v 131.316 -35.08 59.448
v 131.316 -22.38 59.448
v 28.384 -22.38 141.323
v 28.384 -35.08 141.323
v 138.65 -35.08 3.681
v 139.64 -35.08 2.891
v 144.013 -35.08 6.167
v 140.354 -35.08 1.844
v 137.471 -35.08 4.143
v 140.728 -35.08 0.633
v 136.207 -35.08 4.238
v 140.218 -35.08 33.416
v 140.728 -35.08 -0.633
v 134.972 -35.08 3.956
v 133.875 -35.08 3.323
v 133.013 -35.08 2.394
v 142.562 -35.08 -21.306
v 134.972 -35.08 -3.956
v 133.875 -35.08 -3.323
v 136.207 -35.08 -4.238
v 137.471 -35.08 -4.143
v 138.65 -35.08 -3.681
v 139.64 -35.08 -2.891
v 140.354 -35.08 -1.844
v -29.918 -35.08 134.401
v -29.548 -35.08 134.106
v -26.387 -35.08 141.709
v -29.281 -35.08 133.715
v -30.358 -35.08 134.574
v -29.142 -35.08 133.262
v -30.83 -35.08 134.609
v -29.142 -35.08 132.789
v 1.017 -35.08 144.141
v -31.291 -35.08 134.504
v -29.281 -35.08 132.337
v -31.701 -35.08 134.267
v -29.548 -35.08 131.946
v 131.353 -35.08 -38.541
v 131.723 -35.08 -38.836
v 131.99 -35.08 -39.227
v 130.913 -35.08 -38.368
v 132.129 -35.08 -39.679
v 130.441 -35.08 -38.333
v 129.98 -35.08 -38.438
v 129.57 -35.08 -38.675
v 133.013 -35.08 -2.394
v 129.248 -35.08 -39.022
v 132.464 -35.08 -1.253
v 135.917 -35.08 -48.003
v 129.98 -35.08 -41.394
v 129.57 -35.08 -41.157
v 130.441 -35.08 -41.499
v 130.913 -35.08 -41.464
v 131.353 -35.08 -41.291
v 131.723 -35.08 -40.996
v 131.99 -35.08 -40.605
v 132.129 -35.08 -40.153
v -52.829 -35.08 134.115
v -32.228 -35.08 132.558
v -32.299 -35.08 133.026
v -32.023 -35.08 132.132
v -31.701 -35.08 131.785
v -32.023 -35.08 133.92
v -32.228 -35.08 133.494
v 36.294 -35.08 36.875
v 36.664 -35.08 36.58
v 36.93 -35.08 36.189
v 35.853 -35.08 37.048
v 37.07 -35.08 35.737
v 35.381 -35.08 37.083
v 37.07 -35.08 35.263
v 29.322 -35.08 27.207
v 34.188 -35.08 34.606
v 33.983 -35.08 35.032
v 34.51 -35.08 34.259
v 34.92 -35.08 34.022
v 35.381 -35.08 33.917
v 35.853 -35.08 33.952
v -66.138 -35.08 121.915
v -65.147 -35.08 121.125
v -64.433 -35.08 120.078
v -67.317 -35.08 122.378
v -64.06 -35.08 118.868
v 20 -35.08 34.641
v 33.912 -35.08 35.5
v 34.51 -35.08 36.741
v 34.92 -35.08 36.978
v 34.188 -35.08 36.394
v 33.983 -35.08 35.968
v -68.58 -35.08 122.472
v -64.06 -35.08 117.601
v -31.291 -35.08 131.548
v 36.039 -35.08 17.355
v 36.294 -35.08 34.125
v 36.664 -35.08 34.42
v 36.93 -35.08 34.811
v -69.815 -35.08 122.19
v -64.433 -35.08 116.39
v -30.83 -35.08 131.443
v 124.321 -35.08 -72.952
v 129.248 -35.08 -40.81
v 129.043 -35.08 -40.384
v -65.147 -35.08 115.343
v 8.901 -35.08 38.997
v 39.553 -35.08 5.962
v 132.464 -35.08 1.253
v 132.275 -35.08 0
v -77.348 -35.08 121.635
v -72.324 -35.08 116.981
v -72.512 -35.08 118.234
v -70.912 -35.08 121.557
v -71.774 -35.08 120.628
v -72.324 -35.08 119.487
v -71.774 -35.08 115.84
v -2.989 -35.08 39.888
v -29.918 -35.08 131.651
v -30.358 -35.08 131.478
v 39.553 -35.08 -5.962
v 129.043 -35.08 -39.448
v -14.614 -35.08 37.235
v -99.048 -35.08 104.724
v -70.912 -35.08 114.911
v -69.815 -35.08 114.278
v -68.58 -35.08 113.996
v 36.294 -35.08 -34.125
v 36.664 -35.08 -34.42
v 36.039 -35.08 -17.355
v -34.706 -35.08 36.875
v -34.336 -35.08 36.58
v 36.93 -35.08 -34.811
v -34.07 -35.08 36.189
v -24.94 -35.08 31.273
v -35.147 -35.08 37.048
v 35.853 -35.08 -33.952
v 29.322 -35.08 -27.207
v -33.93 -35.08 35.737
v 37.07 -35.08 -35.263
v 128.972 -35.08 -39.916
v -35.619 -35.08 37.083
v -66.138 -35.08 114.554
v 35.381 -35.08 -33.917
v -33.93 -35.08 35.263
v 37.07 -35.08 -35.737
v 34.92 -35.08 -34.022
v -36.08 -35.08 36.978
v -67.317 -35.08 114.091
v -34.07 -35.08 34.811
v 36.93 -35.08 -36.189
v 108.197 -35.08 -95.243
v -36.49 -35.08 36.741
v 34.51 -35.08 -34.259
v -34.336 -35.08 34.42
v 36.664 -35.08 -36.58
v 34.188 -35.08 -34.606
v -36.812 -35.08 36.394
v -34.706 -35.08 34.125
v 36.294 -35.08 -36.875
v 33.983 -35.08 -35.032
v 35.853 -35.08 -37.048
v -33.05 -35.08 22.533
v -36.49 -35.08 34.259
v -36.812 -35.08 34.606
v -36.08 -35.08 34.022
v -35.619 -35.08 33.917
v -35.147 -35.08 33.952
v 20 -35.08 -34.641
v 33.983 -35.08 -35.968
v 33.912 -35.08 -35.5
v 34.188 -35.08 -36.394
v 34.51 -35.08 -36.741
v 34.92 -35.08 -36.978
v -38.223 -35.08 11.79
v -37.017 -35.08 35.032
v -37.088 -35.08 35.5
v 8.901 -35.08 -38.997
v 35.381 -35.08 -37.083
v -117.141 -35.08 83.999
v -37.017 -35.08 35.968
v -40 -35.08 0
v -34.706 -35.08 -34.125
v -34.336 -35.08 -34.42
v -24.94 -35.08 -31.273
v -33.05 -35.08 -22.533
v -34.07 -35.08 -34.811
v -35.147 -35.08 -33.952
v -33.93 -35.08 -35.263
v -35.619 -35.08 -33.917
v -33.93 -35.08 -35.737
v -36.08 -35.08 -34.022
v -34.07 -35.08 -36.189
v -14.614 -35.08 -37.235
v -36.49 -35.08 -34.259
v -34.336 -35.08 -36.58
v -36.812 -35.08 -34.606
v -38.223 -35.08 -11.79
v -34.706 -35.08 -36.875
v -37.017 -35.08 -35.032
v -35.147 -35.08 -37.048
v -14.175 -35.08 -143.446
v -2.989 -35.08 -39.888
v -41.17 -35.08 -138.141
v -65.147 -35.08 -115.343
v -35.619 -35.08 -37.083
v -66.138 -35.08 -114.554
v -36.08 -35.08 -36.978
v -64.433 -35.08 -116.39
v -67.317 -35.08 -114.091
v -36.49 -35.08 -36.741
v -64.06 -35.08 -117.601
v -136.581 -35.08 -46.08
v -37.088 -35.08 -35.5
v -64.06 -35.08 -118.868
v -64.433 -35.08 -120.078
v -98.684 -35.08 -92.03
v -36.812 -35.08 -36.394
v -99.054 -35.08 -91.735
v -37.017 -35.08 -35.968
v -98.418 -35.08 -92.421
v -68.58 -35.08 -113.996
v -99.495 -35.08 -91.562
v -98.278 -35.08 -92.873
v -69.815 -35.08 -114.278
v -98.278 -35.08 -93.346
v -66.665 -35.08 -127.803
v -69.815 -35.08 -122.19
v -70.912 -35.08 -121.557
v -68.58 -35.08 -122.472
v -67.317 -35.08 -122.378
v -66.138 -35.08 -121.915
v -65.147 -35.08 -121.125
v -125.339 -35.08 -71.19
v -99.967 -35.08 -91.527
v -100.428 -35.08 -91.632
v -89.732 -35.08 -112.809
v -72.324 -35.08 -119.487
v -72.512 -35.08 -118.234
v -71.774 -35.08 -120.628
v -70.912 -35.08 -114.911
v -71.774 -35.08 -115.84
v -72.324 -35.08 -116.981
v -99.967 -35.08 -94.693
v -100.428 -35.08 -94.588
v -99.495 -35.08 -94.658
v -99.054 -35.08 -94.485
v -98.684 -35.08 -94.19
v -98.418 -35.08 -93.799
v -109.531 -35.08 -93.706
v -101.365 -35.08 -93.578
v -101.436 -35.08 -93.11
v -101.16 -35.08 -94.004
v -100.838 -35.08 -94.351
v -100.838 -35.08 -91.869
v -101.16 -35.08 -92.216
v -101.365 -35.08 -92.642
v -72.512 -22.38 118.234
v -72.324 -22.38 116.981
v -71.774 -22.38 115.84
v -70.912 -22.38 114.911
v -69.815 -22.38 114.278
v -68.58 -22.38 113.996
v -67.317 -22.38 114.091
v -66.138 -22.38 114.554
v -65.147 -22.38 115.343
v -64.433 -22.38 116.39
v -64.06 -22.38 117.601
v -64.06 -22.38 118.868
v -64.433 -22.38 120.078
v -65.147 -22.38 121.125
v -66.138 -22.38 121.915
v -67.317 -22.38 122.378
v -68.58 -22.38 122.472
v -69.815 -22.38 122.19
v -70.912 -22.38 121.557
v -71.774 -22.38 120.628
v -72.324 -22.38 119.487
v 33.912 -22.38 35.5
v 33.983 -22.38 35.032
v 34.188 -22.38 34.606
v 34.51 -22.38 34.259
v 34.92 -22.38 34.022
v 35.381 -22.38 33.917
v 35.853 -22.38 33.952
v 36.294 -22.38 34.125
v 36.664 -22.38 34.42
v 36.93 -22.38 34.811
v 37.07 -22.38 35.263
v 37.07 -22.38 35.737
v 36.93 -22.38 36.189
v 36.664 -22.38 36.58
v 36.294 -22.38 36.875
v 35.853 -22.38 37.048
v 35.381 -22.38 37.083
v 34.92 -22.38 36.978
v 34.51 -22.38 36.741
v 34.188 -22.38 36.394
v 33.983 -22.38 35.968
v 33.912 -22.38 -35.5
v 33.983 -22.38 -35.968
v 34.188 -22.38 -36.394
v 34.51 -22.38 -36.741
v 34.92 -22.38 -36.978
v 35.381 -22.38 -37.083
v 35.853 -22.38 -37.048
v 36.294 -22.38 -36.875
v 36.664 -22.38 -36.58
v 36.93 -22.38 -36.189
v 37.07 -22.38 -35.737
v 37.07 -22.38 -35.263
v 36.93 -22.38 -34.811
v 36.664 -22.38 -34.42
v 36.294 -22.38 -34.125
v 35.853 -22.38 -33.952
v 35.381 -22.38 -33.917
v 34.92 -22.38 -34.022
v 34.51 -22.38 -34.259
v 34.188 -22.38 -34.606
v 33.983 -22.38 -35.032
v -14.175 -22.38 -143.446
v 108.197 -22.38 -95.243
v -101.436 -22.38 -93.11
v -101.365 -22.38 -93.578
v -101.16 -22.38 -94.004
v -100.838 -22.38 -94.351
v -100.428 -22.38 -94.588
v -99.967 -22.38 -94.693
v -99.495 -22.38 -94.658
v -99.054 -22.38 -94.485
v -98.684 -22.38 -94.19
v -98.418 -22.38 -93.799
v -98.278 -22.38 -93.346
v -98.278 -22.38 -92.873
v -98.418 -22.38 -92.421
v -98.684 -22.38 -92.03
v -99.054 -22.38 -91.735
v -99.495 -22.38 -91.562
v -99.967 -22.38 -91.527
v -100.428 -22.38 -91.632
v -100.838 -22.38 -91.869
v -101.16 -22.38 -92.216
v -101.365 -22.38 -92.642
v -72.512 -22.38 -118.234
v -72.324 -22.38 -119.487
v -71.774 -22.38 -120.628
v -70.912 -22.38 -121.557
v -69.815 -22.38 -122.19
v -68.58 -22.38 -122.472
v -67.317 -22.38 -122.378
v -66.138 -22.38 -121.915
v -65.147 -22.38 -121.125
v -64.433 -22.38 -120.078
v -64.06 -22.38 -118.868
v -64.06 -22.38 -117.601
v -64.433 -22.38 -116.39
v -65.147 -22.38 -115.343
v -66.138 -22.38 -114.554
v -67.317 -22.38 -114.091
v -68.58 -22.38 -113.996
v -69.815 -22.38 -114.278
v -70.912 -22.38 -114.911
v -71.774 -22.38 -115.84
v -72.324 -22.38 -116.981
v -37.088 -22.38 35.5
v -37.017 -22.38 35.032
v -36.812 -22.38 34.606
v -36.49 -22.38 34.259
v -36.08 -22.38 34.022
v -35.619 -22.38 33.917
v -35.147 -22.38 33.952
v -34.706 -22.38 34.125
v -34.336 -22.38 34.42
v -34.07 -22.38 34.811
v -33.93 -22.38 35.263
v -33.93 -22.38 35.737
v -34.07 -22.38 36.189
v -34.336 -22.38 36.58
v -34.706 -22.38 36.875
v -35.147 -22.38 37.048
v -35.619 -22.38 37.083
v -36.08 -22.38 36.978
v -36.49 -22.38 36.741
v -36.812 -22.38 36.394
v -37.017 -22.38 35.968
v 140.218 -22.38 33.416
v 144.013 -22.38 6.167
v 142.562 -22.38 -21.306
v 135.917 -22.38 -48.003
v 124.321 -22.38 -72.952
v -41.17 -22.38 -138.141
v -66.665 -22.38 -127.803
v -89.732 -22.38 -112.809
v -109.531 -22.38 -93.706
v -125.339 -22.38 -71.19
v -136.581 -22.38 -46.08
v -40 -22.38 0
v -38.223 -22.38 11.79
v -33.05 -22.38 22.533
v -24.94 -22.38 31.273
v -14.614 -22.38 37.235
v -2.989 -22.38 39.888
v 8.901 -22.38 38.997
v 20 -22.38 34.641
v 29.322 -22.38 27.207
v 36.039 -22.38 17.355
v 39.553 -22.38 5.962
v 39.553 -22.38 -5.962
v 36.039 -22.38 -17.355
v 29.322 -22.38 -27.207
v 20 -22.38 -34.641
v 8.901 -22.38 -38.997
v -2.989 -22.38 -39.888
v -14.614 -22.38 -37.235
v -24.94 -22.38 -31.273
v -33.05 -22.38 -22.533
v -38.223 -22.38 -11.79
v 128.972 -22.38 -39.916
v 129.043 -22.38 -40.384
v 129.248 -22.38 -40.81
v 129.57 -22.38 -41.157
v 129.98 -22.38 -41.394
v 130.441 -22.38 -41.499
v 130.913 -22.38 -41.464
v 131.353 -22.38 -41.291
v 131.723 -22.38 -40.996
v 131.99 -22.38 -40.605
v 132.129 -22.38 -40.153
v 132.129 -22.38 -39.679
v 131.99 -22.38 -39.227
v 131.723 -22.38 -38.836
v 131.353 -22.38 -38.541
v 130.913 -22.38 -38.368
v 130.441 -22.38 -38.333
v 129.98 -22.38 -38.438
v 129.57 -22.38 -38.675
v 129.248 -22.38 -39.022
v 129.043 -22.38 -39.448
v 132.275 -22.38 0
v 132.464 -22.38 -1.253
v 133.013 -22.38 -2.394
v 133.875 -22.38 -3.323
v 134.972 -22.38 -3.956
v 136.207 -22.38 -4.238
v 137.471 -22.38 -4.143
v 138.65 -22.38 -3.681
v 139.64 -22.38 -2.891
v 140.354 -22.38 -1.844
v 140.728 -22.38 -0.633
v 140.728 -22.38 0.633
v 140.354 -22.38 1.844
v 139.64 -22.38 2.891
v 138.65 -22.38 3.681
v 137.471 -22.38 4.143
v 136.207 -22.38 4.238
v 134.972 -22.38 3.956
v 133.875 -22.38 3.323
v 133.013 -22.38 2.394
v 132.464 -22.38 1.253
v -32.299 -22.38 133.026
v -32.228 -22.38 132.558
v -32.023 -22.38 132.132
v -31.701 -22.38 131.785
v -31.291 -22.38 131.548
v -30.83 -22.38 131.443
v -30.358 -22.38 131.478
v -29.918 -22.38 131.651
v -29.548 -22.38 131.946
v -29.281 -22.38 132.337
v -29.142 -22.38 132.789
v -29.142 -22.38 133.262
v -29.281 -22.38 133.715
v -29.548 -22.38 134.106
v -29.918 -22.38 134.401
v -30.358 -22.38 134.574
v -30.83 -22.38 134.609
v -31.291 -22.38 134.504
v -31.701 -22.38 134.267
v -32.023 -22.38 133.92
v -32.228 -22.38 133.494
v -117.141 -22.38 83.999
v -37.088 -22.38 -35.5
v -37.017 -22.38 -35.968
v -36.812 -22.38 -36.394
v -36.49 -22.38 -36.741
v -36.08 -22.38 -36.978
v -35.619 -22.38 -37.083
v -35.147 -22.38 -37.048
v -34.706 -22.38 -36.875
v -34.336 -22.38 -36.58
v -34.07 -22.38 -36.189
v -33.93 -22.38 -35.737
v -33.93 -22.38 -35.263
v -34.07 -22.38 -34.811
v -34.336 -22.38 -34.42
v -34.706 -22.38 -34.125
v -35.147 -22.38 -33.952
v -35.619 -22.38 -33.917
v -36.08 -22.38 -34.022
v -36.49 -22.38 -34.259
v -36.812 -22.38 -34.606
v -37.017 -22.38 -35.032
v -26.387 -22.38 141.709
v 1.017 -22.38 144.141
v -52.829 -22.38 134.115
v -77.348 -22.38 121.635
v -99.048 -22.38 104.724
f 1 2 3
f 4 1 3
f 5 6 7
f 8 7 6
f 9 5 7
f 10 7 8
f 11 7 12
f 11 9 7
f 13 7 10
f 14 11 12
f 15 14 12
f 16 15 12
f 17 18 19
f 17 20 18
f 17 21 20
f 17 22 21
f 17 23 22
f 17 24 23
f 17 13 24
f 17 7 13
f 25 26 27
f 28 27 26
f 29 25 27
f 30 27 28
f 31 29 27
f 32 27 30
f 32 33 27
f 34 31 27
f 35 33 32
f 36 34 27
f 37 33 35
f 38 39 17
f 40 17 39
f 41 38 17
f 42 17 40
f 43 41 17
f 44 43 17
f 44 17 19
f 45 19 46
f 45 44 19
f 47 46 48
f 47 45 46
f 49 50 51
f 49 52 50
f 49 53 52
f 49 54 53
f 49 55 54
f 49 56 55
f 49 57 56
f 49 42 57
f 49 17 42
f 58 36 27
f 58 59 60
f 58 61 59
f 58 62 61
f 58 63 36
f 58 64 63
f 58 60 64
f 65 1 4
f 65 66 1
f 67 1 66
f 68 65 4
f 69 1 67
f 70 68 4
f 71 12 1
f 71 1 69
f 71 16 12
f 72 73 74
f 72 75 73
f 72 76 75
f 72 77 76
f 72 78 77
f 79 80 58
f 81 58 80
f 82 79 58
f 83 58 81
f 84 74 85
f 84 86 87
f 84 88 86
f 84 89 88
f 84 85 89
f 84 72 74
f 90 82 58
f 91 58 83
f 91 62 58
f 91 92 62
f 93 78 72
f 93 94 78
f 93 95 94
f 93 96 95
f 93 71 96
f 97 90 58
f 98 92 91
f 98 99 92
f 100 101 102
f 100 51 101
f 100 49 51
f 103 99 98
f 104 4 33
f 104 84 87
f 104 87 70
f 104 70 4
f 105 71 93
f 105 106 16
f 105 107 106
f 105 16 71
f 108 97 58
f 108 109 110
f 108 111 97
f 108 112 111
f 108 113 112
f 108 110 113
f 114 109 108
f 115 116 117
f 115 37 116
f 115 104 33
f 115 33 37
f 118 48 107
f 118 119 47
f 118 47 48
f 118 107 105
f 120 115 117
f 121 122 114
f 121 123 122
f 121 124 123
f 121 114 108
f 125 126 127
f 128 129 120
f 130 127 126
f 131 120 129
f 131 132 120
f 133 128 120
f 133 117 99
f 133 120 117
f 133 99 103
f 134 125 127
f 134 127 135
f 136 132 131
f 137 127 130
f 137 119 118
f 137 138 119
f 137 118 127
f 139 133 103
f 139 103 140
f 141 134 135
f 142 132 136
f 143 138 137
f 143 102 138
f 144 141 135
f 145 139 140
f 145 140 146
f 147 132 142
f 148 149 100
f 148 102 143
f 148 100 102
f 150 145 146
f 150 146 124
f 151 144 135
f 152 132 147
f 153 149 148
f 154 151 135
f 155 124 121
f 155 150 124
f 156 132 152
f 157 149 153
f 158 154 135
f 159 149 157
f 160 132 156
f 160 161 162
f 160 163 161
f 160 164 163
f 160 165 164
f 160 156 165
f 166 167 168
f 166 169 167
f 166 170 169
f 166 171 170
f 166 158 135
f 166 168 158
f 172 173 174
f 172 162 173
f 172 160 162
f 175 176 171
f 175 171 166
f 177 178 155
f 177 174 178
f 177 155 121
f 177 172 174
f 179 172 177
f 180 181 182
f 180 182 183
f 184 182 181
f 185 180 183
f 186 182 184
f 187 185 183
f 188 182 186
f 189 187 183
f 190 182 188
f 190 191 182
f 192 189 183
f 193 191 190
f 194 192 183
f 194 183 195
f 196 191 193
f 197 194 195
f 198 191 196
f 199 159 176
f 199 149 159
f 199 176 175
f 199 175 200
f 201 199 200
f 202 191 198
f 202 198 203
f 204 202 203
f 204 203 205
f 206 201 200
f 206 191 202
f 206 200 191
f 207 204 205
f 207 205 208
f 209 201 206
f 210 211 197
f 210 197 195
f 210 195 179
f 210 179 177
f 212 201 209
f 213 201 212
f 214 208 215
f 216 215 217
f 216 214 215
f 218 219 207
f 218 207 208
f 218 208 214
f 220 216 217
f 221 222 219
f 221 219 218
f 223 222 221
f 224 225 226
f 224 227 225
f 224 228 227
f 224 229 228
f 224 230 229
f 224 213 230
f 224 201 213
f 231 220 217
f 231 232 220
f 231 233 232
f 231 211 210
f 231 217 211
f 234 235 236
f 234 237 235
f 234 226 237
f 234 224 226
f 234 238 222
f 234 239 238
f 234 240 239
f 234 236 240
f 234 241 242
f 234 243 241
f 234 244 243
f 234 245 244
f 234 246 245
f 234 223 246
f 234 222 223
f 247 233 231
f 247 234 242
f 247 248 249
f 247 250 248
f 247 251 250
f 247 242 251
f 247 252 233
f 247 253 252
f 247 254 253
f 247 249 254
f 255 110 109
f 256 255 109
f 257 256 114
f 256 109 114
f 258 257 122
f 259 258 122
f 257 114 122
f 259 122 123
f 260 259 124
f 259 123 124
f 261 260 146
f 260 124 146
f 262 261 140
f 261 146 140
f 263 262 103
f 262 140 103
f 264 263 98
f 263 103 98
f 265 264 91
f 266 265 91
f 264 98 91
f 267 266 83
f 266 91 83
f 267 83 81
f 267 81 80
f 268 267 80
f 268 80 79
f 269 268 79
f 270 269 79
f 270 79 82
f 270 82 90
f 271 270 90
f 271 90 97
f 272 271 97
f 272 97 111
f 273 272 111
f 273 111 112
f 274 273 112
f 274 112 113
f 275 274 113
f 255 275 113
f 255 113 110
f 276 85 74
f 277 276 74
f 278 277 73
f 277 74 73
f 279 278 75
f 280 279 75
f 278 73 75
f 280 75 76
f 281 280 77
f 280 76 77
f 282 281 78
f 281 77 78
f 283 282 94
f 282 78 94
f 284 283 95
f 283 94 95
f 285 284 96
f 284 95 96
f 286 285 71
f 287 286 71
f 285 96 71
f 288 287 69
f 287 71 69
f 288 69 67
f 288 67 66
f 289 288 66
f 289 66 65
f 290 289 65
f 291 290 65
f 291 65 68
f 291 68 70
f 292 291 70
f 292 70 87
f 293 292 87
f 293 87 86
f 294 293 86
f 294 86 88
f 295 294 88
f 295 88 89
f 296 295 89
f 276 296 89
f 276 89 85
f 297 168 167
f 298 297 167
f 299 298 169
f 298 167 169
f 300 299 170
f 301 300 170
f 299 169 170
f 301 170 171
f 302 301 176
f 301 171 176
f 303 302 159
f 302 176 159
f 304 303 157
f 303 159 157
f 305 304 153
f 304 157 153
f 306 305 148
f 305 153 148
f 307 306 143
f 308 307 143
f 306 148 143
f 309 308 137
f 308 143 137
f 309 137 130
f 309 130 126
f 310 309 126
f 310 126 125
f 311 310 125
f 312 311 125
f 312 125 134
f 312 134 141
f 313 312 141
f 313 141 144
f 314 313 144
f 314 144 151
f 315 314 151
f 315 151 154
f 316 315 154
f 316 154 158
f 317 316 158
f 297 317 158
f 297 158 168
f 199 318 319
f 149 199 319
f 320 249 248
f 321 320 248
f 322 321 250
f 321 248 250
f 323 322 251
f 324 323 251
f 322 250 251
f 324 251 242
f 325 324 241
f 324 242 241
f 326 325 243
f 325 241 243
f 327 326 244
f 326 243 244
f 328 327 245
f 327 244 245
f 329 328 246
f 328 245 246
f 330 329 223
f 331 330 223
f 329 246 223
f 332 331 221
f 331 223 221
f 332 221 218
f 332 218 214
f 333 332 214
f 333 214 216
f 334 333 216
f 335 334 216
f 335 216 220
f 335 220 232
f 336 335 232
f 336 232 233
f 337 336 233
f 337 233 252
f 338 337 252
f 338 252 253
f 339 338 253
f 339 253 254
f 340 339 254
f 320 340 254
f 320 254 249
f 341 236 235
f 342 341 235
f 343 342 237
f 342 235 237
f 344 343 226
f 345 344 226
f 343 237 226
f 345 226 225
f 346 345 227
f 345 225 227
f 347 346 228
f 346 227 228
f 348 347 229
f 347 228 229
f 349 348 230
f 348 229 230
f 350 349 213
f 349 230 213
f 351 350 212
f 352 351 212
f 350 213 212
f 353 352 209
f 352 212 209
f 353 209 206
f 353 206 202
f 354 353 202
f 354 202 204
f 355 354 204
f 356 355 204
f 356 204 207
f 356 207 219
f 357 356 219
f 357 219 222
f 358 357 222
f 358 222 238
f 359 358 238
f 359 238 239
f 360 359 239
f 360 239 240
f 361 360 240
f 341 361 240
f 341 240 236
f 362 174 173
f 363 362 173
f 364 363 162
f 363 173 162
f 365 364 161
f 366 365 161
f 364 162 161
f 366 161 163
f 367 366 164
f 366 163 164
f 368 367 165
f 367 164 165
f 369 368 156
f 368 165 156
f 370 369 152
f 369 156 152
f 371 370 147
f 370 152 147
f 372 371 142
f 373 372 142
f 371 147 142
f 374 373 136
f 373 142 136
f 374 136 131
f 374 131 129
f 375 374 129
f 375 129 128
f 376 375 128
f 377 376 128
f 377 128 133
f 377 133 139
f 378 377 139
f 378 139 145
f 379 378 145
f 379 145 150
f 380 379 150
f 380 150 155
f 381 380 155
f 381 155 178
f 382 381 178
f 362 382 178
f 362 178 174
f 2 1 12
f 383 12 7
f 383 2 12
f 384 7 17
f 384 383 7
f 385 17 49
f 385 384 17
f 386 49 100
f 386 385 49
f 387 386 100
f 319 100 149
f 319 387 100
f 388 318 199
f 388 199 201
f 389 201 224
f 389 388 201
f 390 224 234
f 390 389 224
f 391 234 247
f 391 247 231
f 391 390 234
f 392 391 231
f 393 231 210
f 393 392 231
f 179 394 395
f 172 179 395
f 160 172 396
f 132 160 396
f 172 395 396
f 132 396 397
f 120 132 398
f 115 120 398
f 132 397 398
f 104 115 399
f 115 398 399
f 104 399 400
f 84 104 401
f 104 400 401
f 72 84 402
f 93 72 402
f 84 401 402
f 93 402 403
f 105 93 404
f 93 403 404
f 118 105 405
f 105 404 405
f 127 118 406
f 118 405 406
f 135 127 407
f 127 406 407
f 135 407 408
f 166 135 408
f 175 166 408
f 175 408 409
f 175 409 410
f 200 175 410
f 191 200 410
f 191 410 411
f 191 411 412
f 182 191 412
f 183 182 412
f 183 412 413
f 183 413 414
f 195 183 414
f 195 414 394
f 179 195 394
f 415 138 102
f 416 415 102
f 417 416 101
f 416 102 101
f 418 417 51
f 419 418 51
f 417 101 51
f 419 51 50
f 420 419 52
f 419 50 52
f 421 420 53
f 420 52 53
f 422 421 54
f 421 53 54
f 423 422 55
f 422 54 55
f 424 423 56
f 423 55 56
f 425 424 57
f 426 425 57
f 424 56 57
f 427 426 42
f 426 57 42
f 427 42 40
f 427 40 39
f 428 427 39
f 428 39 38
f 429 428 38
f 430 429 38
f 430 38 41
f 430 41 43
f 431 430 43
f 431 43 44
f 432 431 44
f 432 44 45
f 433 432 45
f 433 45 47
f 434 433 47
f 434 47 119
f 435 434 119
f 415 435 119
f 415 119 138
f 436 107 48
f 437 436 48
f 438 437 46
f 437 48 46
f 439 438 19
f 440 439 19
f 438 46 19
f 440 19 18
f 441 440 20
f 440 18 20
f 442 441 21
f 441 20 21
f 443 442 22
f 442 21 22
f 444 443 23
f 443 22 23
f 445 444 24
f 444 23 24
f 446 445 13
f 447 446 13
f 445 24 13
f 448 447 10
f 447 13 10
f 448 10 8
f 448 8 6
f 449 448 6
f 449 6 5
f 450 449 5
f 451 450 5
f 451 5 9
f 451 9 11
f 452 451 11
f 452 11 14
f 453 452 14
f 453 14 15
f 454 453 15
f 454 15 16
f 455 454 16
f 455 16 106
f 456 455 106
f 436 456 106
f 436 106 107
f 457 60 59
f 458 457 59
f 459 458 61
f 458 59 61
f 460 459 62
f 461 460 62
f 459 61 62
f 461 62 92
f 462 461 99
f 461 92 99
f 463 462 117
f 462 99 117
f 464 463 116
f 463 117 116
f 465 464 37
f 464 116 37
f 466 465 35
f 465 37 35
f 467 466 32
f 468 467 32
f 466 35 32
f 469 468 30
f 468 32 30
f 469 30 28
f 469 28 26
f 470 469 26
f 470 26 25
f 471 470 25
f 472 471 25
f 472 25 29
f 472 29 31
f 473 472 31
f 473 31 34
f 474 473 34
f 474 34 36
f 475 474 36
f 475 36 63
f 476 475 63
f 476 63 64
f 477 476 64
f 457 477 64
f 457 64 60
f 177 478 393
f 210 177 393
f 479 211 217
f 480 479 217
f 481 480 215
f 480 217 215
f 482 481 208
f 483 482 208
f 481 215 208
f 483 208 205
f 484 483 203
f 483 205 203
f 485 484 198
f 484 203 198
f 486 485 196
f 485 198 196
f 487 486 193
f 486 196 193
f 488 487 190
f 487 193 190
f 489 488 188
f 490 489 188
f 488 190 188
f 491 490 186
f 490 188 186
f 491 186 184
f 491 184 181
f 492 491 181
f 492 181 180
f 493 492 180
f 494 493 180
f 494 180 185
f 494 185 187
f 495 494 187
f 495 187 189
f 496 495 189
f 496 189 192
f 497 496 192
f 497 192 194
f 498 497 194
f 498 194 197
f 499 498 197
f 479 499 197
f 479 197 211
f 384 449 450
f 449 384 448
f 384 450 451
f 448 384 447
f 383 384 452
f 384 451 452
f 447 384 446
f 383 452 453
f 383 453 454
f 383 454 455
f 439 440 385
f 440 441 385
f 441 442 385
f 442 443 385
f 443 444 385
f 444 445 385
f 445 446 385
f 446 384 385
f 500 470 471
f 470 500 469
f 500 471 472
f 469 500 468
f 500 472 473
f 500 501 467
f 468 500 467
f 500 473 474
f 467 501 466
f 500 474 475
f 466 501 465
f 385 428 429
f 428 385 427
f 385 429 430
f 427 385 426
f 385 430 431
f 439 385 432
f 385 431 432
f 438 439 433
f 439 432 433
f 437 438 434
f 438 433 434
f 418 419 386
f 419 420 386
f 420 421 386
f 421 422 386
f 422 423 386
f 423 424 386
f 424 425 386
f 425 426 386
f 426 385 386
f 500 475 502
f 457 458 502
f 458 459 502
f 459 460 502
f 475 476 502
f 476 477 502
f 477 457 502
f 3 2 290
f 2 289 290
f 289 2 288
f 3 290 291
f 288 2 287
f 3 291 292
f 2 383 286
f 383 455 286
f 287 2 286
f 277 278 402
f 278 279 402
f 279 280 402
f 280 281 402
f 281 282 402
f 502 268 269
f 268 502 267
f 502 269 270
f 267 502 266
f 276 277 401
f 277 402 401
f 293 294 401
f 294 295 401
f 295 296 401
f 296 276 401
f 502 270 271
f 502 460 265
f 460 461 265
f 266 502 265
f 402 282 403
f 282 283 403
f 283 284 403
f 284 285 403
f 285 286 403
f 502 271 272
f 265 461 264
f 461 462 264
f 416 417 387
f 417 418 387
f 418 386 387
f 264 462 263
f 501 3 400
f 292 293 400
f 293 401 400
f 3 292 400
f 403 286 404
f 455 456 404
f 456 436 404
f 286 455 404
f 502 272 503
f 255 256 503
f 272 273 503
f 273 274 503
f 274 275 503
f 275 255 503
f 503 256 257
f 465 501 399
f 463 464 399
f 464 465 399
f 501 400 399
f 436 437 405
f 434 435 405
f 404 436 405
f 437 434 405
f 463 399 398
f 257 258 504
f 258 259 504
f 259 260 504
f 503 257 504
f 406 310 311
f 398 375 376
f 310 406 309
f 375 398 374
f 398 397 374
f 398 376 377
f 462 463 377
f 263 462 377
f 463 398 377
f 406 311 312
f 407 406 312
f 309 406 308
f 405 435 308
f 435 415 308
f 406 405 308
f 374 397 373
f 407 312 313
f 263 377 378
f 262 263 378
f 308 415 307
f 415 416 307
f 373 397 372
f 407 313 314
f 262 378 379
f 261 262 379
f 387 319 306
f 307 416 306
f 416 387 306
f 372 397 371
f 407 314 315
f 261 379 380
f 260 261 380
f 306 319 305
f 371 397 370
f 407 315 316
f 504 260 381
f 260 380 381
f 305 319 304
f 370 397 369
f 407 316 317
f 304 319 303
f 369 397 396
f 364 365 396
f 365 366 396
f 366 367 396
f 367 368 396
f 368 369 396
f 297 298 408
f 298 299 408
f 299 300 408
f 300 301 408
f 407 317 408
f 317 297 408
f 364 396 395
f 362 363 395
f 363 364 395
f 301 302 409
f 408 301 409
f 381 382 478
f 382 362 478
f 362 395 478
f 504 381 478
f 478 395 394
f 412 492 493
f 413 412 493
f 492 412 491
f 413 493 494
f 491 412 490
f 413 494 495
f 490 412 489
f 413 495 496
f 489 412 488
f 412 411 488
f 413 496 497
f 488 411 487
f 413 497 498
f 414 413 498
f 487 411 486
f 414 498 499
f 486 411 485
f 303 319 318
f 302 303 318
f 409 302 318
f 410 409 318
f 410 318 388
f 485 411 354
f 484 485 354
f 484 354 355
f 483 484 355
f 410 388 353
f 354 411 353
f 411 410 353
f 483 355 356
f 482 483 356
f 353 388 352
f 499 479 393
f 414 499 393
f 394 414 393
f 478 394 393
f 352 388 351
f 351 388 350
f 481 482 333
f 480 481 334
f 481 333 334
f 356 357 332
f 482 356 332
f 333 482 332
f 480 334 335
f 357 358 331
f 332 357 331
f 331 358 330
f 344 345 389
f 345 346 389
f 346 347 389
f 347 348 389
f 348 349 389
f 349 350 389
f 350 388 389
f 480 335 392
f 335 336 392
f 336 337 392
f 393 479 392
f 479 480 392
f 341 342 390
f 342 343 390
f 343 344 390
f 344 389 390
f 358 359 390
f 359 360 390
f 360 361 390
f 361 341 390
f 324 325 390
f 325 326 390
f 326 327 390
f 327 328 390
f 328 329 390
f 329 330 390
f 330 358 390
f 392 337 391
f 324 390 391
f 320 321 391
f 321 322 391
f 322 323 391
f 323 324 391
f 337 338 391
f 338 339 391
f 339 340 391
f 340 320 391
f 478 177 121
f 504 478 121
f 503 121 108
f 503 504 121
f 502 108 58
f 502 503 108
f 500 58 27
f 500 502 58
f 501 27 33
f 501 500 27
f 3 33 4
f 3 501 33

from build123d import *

# Parameters (mm, degrees)
SKETCH1_W                    = 144.145
SKETCH1_H                    = 12.7
F_1_8_0_125_DIAMETER_HOLE1_D = 3.175
SKETCH4_OUTSIDE_W            = 371.87
SKETCH4_OUTSIDE_H            = 371.87
CUT_EXTRUDE1_DEPTH           = 205.247036821
SKETCH6_R                    = 40
CUT_EXTRUDE2_DEPTH           = 205.247036821
M10X1_5_TAPPED_HOLE1_D       = 8.5


with BuildPart() as part:
    # Sketch1 → Revolve1 (revolve)
    with BuildSketch(Plane.XY):
        with Locations((72.0725, -28.730222222)):
            Rectangle(SKETCH1_W, SKETCH1_H)
    revolve(axis=Axis((1e-09, -200000, 0), (0, 1, 0)))

    # 1/8 (0.125) Diameter Hole1 (through all)
    with Locations(Plane(origin=(0, -22.380222222, 0), x_dir=(1, 0, 0), z_dir=(0, 1, 0))):
        with Locations((136.525, 0), (-68.2625, -118.234118252), (-68.2625, 118.234118252), (-99.848064114, 93.109826108), (130.559506808, 39.916046987), (-30.711442694, -133.025873095), (-35.5, -35.5), (-35.5, 35.5), (35.5, 35.5), (35.5, -35.5)):
            Hole(F_1_8_0_125_DIAMETER_HOLE1_D / 2)

    # Sketch4 outside → Cut-Extrude1 (cut, through all)
    with BuildSketch(Plane(origin=(0, -22.380222222, 0), x_dir=(1, 0, 0), z_dir=(0, 1, 0))):
        Rectangle(SKETCH4_OUTSIDE_W, SKETCH4_OUTSIDE_H)
        Polygon((253.722129587, 37.919026331), (-94.022224704, -238.68932289), (-159.699904883, 200.770296559), align=None, mode=Mode.SUBTRACT)
    extrude(amount=-CUT_EXTRUDE1_DEPTH, mode=Mode.SUBTRACT)

    # Sketch6 → Cut-Extrude2 (cut, through all)
    with BuildSketch(Plane(origin=(0, -22.380222222, 0), x_dir=(1, 0, 0), z_dir=(0, 1, 0))):
        with Locations(Location((0, 0, 0), (0, 0, 180))):
            Circle(SKETCH6_R)
    extrude(amount=-CUT_EXTRUDE2_DEPTH, mode=Mode.SUBTRACT)

    # M10x1.5 Tapped Hole1 (through all)
    with Locations(Plane(origin=(0, -22.380222222, 0), x_dir=(1, 0, 0), z_dir=(0, 1, 0))):
        with Locations((-68.2625, 118.234118252), (136.525, 0), (-68.2625, -118.234118252)):
            Hole(M10X1_5_TAPPED_HOLE1_D / 2)


solid = part.part
